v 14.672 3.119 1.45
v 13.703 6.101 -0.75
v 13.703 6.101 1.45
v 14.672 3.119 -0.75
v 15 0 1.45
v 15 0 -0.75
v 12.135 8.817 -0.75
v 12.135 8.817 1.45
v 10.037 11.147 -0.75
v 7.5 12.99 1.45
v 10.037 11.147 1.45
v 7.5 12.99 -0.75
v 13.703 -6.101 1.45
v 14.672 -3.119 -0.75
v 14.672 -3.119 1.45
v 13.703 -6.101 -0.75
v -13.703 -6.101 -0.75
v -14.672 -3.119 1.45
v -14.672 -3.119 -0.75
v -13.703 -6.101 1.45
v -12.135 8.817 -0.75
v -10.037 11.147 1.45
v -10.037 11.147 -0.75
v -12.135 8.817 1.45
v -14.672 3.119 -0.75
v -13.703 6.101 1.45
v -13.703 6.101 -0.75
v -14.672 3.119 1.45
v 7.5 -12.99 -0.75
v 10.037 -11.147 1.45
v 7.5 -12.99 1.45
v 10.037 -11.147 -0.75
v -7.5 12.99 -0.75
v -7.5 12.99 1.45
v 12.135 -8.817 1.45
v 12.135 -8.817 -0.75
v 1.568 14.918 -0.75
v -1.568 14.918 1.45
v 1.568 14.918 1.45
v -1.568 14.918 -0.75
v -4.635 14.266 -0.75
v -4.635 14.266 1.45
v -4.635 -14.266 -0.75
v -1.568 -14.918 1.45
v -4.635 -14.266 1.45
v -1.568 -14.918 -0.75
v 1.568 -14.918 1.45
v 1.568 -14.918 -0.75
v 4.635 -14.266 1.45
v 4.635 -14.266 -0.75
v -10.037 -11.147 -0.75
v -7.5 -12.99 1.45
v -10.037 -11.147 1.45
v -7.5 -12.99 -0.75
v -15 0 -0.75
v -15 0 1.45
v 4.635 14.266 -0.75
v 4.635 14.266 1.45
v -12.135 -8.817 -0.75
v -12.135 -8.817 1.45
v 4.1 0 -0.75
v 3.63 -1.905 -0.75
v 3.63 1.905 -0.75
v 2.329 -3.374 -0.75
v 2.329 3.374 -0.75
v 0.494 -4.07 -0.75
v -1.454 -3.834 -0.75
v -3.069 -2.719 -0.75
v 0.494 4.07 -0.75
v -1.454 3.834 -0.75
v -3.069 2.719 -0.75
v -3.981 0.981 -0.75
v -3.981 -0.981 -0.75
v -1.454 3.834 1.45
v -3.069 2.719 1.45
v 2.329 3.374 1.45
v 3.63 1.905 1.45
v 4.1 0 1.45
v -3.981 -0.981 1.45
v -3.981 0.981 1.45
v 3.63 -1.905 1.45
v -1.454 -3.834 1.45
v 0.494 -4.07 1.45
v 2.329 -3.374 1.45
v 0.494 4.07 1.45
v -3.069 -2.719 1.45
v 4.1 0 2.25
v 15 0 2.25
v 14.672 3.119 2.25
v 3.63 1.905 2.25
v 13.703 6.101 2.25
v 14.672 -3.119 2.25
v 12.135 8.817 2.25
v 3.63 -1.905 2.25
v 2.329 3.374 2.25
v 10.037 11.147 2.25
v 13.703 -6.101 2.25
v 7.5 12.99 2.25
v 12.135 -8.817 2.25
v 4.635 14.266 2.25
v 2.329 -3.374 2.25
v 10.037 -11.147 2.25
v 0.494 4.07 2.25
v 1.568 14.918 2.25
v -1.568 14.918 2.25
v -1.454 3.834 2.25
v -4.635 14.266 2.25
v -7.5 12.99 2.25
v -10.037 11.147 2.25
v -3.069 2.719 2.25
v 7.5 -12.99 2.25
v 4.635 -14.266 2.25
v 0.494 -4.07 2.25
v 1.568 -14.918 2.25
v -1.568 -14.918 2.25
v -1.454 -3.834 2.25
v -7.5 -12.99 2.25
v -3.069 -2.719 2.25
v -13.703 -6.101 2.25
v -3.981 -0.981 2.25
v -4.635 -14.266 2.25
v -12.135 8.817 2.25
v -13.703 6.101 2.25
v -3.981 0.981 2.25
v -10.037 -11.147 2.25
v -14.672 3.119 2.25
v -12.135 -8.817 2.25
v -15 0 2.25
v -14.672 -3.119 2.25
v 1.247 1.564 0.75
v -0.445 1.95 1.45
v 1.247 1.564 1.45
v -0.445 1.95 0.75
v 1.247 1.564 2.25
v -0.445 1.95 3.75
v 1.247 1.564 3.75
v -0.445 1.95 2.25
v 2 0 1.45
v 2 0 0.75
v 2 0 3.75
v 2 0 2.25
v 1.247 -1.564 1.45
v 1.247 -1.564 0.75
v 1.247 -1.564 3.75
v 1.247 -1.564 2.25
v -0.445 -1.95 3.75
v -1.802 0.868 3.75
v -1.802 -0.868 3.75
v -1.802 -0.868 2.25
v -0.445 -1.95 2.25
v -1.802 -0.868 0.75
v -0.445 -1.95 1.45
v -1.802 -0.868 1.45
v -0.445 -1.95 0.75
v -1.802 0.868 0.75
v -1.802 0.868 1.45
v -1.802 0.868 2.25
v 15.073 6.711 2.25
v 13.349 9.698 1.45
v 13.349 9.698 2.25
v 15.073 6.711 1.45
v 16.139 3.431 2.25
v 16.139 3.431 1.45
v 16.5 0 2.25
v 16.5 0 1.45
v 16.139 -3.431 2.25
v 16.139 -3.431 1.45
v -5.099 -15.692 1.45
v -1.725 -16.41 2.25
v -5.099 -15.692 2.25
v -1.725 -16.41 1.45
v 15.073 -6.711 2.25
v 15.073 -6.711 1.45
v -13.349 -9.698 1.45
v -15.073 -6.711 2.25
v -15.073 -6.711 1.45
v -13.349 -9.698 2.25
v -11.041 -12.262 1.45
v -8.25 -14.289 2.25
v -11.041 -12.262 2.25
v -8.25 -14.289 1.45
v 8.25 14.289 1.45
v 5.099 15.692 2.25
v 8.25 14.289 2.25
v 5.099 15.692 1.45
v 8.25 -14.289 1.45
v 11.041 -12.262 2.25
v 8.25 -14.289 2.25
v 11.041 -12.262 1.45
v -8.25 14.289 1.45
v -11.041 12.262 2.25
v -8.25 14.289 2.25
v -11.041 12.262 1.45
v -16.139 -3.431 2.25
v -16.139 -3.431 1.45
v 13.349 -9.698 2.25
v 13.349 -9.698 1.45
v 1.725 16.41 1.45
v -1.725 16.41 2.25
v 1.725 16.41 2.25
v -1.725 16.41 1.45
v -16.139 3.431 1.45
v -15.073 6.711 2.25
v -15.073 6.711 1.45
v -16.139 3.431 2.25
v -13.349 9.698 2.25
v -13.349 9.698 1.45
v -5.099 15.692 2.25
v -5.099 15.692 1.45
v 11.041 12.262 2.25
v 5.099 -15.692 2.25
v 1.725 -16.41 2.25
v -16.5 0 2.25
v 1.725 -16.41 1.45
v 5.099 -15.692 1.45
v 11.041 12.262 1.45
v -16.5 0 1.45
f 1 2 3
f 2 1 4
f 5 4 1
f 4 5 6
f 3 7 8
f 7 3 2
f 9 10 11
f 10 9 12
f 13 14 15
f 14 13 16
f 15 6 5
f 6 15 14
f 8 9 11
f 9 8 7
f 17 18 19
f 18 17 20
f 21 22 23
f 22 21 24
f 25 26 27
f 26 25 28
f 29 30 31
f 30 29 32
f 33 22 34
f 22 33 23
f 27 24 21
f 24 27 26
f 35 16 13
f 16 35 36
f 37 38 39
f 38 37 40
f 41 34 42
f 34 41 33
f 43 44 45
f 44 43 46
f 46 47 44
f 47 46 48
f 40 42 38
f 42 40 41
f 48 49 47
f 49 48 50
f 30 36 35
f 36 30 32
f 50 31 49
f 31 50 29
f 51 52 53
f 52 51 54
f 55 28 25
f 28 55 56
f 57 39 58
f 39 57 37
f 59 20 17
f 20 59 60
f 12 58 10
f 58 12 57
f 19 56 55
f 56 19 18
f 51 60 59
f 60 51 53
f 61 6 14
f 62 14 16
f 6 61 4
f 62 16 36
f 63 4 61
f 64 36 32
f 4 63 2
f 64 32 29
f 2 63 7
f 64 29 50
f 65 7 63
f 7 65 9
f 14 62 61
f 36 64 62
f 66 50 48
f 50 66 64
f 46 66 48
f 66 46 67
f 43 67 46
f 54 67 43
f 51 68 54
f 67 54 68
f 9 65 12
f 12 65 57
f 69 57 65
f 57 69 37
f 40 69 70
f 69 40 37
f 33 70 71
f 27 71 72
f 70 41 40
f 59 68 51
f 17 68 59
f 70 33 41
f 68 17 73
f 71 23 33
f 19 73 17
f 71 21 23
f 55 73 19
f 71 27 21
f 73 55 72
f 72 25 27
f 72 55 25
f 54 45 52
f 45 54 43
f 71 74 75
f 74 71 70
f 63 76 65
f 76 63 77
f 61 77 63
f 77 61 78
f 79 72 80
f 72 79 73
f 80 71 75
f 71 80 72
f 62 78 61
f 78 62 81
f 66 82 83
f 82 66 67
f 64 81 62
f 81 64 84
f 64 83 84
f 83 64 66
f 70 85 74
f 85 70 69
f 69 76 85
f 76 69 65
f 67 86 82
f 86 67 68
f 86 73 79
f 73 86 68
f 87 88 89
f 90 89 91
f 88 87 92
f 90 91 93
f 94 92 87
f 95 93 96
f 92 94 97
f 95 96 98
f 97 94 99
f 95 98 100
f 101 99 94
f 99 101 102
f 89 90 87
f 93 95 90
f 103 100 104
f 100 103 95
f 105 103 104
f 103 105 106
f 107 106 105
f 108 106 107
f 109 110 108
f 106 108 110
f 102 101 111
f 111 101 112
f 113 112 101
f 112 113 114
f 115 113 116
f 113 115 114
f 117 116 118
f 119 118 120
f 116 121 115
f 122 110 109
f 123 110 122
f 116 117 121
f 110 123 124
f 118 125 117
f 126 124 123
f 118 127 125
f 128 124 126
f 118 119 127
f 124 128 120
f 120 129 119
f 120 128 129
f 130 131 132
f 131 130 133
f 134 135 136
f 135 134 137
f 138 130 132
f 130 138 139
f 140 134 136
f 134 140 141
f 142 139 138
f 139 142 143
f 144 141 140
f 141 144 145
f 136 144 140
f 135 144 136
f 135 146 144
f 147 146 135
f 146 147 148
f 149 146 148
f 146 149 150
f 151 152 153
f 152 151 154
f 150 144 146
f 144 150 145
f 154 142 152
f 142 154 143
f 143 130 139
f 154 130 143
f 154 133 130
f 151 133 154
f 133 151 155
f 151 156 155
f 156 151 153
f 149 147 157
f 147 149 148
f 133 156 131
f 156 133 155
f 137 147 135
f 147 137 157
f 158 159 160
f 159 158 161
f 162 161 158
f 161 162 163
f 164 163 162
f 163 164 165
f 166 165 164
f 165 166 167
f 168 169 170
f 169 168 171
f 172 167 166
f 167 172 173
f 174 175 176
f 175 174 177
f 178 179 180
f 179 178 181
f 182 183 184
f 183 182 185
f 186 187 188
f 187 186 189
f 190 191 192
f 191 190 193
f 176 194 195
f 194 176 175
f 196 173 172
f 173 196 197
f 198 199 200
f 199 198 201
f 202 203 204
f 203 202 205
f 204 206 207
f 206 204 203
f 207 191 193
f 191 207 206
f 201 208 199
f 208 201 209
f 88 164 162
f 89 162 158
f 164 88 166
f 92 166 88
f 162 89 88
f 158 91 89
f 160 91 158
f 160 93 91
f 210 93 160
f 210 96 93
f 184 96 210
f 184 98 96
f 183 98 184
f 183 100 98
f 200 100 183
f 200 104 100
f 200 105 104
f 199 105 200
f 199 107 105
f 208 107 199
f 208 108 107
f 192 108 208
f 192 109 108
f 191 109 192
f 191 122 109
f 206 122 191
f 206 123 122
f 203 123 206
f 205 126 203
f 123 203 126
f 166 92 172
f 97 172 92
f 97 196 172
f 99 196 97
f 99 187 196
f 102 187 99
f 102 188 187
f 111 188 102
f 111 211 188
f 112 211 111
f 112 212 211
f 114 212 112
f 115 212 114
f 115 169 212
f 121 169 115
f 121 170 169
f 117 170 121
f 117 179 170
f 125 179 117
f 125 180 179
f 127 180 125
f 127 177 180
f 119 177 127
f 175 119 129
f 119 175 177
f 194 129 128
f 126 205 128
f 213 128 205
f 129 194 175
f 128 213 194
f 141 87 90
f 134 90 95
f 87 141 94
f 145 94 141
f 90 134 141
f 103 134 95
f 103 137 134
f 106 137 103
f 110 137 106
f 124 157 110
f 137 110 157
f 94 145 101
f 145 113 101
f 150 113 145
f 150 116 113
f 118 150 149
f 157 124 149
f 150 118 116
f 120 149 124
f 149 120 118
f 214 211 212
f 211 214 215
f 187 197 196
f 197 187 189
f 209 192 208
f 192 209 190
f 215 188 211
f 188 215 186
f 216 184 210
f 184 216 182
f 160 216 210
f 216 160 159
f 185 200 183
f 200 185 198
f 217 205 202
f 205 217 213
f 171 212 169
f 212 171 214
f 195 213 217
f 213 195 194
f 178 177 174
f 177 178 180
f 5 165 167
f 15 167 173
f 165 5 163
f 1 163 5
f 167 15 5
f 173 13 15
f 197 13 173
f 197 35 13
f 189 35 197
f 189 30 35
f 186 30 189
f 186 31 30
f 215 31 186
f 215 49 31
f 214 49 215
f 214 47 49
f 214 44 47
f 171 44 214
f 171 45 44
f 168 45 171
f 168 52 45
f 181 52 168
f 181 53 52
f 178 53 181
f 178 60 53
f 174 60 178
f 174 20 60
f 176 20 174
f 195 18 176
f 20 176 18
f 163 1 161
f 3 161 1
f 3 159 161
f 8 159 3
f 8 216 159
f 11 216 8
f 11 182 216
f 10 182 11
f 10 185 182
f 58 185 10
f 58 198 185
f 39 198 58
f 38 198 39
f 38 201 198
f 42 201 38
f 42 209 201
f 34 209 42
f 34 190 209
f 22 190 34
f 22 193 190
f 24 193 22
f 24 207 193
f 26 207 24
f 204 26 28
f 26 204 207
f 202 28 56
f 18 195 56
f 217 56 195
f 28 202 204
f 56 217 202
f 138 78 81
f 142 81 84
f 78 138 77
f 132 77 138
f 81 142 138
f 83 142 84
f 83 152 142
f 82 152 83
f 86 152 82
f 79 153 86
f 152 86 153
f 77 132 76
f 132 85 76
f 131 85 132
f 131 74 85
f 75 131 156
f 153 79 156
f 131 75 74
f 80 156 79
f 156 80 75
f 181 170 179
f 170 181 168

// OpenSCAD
// Parameters
inner_diameter = 8.0; //[4.0:16.0:0.1]
outer_diameter = 30.0; //[15.0:60.0:0.1]
thickness = 1.5; //[0.75:3.0:0.05]
hole_clearance = 0.2; //[0.0:0.6:0.05]
overlap = 0.8; //[0.5:2.0:0.1]
grommet_lip_height = 0.8; //[0.4:2.0:0.1]
grommet_lip_radial = 1.5; //[0.8:4.0:0.1]

// Penny Washer - complete geometry
module penny_washer() {
  color("Silver") {
    difference() {
      // Washer body
      cylinder(r=outer_diameter/2, h=thickness, center=true);
      // Inner through-hole
      translate([0, 0, -overlap])
        cylinder(r=(inner_diameter + hole_clearance)/2, h=thickness + 2*overlap, center=true);
    }
  }
}

// Screw And Washer - complete geometry
module screw_and_washer() {
  color("DimGray") {
    // Screw body (simplified as a cylinder for this example)
    translate([0, 0, thickness/2])
      cylinder(r=inner_diameter/4, h=thickness*2, center=true);
    // Washer
    penny_washer();
  }
}

// Round Grommet Top - complete geometry
module round_grommet_top() {
  color("Black") {
    // Grommet lip
    translate([0, 0, thickness/2 + grommet_lip_height/2 - overlap])
      cylinder(r=outer_diameter/2 + grommet_lip_radial, h=grommet_lip_height, center=true);
  }
}

// Round Grommet Assembly - complete geometry
module round_grommet_assembly() {
  union() {
    penny_washer();
    round_grommet_top();
  }
}

// Assembly
module assembly() {
  penny_washer();
  translate([0, 0, thickness]) screw_and_washer();
  translate([0, 0, thickness]) round_grommet_assembly();
}

assembly();
